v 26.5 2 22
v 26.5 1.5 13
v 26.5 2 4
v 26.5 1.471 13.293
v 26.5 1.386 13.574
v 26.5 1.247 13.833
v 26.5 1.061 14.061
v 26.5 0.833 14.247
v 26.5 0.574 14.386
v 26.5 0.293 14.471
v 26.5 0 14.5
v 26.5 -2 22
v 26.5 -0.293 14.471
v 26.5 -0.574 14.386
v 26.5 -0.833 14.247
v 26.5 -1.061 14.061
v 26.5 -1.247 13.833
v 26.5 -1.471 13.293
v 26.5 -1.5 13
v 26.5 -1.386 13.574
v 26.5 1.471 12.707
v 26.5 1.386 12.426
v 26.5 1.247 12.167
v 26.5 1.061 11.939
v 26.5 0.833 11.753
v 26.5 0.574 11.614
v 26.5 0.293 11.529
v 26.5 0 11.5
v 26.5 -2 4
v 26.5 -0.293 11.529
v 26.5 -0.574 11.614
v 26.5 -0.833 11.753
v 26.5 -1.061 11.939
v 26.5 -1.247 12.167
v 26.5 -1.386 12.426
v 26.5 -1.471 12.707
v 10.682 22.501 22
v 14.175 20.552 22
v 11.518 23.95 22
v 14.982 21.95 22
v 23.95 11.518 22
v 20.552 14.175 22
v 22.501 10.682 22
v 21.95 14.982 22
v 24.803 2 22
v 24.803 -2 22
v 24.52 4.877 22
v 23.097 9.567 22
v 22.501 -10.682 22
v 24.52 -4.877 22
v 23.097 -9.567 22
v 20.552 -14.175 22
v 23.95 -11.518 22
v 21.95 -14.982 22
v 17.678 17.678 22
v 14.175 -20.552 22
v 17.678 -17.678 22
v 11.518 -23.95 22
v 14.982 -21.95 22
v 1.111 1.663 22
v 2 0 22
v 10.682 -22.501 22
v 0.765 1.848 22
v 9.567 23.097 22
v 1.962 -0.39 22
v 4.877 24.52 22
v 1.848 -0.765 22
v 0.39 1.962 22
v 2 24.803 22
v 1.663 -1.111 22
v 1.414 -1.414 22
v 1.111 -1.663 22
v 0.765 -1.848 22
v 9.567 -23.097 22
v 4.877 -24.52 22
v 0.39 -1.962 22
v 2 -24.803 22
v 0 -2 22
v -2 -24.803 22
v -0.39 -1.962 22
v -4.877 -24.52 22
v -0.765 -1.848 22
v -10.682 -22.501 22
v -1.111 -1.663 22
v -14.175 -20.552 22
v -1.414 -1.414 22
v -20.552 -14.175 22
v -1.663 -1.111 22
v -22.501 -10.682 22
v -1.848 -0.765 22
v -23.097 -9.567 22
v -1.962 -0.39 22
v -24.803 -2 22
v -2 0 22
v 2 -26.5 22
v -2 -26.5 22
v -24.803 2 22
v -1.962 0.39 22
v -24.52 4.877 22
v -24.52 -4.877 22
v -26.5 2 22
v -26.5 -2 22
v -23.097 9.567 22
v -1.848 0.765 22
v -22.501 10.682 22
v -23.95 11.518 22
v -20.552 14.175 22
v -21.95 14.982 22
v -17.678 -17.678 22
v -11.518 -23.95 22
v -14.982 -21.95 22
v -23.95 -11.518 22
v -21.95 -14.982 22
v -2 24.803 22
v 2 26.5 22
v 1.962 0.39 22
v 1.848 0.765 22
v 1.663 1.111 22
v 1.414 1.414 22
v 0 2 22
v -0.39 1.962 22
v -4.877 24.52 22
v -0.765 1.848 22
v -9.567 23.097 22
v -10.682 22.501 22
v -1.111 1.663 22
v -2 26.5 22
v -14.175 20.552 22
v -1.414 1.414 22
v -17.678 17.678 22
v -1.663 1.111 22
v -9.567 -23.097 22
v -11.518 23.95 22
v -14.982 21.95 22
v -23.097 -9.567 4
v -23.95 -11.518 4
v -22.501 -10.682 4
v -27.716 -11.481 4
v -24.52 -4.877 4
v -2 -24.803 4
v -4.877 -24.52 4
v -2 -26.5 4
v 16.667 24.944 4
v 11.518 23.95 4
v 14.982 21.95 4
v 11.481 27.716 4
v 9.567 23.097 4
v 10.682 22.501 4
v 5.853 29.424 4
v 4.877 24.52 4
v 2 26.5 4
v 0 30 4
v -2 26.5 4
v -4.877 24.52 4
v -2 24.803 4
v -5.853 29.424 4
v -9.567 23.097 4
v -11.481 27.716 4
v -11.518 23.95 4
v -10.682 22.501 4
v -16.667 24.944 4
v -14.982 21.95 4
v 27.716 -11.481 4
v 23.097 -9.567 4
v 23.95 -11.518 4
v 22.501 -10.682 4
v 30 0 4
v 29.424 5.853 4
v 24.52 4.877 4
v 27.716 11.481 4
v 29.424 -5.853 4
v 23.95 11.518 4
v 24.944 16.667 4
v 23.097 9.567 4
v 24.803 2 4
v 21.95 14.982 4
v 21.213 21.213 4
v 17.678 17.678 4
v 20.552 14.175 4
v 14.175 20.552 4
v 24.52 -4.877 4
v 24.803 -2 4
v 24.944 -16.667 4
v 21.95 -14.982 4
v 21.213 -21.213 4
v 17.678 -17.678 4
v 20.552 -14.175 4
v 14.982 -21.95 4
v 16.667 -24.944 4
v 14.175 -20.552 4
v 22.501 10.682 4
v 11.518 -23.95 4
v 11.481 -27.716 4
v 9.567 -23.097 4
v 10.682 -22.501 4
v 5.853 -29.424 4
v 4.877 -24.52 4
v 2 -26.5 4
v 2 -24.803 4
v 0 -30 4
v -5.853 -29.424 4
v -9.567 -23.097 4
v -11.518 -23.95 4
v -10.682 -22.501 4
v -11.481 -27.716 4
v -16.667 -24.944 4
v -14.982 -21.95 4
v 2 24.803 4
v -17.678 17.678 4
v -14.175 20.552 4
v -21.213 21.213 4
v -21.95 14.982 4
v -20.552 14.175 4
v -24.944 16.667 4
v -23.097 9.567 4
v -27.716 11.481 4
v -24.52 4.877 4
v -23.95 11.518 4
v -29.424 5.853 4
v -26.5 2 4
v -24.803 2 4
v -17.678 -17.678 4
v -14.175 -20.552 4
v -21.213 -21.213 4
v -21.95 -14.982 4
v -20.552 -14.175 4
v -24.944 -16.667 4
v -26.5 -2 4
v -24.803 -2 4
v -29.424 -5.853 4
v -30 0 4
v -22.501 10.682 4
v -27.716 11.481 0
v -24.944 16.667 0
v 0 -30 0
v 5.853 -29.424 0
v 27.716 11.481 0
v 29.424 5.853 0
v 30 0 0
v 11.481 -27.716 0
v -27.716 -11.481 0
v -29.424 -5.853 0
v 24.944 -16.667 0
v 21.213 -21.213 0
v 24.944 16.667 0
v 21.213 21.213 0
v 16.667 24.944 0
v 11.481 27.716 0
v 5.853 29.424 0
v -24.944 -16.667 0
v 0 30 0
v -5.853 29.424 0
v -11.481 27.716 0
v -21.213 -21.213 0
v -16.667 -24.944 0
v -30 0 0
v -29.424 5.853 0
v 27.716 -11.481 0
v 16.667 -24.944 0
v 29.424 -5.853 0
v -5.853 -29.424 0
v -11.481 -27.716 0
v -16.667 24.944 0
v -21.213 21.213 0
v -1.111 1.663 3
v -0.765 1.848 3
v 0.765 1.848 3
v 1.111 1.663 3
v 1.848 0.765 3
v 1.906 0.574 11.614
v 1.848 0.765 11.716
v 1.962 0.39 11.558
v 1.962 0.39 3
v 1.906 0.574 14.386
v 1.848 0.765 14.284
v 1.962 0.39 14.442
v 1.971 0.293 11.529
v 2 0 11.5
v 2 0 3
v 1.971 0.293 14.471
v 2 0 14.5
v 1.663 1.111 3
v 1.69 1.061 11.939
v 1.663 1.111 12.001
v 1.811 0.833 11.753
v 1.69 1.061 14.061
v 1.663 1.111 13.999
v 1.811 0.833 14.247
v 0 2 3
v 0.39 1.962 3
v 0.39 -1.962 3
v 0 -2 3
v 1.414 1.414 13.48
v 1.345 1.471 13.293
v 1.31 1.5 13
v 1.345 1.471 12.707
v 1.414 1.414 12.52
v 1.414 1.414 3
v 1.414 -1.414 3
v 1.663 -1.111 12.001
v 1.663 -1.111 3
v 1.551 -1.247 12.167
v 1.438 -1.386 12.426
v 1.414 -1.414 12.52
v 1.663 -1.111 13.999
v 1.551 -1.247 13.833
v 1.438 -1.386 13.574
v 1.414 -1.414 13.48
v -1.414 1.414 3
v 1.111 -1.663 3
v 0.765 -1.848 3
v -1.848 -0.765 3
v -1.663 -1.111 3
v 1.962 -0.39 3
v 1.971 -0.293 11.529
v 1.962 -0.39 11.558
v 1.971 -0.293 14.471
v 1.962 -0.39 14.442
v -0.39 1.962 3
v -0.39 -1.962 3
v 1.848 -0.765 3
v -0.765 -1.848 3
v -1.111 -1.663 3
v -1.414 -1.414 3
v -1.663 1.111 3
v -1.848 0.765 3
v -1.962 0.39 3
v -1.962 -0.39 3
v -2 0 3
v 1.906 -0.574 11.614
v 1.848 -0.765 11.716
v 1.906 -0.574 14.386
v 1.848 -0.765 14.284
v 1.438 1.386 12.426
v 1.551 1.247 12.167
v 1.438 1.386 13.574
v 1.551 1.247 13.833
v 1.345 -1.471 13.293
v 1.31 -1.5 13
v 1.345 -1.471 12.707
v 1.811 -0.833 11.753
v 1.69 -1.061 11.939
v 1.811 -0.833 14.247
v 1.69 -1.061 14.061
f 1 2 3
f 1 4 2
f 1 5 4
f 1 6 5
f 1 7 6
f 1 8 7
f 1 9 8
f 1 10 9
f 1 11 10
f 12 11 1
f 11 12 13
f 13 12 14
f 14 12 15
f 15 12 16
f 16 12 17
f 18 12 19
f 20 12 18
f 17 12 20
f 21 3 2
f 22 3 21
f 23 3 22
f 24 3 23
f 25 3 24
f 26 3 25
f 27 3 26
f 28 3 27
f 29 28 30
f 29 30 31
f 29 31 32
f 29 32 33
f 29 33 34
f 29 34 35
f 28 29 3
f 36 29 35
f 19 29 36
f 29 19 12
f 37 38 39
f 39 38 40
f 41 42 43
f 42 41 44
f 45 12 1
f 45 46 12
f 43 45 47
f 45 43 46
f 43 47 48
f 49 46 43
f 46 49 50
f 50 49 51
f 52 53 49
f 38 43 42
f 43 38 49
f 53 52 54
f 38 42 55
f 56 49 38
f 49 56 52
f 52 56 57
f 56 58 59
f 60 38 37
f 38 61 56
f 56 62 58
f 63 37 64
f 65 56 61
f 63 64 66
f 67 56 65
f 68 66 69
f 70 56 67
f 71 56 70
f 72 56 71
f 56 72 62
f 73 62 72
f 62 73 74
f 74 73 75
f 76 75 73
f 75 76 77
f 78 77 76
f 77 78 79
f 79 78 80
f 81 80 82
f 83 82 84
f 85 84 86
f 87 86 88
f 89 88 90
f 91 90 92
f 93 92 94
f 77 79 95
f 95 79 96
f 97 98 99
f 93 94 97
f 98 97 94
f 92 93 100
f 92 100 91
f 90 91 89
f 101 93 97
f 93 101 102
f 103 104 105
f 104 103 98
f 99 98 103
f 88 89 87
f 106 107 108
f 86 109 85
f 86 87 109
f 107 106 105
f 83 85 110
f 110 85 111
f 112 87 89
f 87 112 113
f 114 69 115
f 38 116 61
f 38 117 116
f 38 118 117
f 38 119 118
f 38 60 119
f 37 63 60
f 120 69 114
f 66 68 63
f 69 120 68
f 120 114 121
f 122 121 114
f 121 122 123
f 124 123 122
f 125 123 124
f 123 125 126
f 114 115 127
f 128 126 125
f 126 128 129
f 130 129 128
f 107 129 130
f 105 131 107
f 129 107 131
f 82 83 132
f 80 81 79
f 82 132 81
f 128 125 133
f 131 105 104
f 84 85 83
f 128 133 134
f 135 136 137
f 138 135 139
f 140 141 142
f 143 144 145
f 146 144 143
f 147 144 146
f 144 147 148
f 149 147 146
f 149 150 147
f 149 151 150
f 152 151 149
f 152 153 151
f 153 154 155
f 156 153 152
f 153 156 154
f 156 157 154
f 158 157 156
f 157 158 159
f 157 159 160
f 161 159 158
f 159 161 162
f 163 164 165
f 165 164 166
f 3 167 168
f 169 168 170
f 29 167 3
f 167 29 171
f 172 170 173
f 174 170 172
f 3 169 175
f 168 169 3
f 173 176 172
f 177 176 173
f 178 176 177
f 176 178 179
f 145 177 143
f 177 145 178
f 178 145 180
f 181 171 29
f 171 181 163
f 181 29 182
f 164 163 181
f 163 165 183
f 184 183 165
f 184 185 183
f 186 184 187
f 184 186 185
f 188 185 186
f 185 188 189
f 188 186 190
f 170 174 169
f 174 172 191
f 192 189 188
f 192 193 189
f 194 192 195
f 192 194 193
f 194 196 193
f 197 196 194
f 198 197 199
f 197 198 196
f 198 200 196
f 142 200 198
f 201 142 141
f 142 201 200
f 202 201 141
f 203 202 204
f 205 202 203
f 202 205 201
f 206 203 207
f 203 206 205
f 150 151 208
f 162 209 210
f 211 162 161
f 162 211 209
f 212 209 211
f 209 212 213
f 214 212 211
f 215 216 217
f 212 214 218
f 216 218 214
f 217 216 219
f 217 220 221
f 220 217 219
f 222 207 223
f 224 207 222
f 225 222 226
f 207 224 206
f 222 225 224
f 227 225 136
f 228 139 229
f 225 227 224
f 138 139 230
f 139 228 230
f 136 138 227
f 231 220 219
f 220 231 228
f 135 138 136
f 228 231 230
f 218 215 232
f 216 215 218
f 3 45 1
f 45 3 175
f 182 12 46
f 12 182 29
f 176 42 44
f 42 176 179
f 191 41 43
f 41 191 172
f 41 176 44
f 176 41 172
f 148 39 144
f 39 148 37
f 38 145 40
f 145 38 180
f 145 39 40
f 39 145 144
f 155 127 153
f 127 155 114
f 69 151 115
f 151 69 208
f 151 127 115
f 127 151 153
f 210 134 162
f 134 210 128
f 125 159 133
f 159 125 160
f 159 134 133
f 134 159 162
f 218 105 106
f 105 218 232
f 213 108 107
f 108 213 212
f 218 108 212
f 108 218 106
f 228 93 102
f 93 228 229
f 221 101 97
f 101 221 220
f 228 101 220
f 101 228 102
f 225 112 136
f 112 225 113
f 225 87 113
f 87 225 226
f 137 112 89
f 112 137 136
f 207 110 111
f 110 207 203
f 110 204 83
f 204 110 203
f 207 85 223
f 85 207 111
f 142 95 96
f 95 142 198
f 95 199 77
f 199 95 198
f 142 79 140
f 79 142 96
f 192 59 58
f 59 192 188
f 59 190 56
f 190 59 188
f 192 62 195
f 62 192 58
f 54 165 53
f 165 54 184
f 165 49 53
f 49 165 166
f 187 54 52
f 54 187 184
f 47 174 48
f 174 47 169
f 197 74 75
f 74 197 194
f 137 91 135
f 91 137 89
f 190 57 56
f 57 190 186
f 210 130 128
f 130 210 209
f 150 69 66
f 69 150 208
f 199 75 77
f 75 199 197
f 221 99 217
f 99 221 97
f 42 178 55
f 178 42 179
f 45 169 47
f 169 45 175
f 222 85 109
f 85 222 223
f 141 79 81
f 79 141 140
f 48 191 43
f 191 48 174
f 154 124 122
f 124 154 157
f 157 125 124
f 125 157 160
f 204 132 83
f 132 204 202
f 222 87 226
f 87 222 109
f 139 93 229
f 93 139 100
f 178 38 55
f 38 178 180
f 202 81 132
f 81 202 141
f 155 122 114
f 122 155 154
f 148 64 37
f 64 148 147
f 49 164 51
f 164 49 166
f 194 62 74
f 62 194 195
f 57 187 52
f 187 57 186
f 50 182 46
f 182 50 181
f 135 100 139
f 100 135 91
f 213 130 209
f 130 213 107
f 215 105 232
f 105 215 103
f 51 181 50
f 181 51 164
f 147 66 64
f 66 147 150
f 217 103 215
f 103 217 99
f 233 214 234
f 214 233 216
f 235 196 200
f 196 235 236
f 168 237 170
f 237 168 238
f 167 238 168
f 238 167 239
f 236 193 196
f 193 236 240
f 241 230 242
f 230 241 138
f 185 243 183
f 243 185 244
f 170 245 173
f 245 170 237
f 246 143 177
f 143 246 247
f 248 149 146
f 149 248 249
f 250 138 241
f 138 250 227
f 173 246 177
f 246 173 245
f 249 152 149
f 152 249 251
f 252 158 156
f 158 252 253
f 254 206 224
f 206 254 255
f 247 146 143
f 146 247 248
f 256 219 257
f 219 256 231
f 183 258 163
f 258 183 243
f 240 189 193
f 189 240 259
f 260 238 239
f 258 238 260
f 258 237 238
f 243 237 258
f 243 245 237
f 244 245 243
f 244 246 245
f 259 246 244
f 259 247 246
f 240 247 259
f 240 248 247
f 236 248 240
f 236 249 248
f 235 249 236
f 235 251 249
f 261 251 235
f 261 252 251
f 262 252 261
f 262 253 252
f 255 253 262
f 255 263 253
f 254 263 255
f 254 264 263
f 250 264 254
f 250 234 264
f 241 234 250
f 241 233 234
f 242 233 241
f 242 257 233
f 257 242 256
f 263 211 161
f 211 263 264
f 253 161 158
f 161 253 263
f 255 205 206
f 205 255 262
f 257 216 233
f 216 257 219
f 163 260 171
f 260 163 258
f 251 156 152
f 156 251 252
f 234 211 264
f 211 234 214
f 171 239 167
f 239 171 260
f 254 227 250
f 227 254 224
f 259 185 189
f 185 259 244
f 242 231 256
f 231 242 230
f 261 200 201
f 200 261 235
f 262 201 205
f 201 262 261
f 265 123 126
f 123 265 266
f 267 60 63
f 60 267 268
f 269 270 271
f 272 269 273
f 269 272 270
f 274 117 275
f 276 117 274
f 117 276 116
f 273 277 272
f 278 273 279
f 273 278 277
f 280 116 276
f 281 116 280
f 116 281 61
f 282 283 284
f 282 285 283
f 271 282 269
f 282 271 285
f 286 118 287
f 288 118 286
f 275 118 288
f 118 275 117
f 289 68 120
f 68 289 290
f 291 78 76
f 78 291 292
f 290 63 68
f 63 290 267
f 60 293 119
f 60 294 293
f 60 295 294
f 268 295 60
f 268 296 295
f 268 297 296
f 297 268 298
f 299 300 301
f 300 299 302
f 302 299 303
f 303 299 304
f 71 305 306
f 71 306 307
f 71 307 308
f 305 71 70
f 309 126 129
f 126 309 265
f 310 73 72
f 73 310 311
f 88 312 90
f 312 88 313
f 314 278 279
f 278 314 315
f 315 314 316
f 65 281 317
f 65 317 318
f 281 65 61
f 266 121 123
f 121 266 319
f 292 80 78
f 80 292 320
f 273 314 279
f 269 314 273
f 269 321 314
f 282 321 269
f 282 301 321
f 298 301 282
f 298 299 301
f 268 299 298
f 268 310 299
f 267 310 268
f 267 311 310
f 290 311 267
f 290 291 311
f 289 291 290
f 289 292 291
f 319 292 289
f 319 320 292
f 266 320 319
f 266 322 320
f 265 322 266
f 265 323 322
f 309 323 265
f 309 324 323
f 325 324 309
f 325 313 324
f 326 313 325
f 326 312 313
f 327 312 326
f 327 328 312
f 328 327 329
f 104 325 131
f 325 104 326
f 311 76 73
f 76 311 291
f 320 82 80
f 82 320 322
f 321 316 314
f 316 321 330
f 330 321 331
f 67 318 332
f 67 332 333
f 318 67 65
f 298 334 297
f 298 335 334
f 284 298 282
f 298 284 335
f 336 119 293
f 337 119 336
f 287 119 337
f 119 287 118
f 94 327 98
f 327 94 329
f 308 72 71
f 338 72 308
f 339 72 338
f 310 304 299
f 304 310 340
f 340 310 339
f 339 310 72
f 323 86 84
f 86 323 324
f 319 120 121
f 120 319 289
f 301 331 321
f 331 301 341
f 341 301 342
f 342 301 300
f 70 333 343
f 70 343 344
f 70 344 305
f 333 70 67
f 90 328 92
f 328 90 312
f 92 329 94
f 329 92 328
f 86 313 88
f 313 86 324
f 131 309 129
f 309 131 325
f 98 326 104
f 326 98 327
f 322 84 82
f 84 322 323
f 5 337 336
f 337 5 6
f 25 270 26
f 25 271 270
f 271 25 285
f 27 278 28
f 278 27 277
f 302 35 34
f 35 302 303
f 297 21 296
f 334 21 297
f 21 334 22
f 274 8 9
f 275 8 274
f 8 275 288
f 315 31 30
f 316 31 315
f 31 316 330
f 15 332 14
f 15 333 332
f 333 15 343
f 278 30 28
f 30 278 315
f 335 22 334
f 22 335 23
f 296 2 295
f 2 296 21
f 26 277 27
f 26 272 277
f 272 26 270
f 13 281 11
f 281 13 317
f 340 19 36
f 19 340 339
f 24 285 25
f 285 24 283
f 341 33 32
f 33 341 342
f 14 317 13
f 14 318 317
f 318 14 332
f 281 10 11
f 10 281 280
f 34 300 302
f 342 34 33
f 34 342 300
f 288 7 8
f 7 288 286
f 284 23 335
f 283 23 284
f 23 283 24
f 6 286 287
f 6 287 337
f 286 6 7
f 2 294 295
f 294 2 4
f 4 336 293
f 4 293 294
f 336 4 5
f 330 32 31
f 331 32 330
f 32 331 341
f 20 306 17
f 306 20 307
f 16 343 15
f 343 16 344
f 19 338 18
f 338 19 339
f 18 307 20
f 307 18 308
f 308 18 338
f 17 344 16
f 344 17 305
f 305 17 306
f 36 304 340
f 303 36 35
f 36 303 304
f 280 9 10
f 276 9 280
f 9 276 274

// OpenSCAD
$fn = 32;

// ----------------------------------------------------------------------
// Control knob: skirt knob with grip ribs
// ----------------------------------------------------------------------

// --- parameters (mm) ---
skirt_d = 60;             // skirt diameter
skirt_t = 4;              // skirt thickness
rib_w = 4;                // grip rib width
rib_out = 2.5;            // grip rib radial protrusion
n_ribs = 12;              // number of grip ribs
knob_d = 50;              // knob body diameter
knob_h = 18;              // knob body height
bore_d = 4;               // shaft bore diameter
set_d = 3;                // set screw bore diameter
fit_tol = 0.05;           // tolerance for press fits, mm
free_tol = 0.3;           // tolerance for clearance fits, mm

rib_step = 360 / n_ribs;  // rib angular step
total_h = skirt_t + knob_h;  // overall height

difference() {
  union() {
    translate([0, 0, skirt_t]) cylinder(h = knob_h, d = knob_d);
    cylinder(h = skirt_t, d = skirt_d);
    for (i = [0 : n_ribs - 1])
      rotate([0, 0, i * rib_step])
        translate([knob_d / 2 - 1, -rib_w / 2, skirt_t])
          cube([rib_out, rib_w, knob_h]);
  }
  translate([0, 0, skirt_t - 1]) cylinder(h = knob_h + 2, d = bore_d);
  translate([-1, 0, skirt_t + knob_h / 2]) rotate([0, 90, 0])
    cylinder(h = knob_d / 2 + bore_d / 2 + 2, d = set_d);
}
